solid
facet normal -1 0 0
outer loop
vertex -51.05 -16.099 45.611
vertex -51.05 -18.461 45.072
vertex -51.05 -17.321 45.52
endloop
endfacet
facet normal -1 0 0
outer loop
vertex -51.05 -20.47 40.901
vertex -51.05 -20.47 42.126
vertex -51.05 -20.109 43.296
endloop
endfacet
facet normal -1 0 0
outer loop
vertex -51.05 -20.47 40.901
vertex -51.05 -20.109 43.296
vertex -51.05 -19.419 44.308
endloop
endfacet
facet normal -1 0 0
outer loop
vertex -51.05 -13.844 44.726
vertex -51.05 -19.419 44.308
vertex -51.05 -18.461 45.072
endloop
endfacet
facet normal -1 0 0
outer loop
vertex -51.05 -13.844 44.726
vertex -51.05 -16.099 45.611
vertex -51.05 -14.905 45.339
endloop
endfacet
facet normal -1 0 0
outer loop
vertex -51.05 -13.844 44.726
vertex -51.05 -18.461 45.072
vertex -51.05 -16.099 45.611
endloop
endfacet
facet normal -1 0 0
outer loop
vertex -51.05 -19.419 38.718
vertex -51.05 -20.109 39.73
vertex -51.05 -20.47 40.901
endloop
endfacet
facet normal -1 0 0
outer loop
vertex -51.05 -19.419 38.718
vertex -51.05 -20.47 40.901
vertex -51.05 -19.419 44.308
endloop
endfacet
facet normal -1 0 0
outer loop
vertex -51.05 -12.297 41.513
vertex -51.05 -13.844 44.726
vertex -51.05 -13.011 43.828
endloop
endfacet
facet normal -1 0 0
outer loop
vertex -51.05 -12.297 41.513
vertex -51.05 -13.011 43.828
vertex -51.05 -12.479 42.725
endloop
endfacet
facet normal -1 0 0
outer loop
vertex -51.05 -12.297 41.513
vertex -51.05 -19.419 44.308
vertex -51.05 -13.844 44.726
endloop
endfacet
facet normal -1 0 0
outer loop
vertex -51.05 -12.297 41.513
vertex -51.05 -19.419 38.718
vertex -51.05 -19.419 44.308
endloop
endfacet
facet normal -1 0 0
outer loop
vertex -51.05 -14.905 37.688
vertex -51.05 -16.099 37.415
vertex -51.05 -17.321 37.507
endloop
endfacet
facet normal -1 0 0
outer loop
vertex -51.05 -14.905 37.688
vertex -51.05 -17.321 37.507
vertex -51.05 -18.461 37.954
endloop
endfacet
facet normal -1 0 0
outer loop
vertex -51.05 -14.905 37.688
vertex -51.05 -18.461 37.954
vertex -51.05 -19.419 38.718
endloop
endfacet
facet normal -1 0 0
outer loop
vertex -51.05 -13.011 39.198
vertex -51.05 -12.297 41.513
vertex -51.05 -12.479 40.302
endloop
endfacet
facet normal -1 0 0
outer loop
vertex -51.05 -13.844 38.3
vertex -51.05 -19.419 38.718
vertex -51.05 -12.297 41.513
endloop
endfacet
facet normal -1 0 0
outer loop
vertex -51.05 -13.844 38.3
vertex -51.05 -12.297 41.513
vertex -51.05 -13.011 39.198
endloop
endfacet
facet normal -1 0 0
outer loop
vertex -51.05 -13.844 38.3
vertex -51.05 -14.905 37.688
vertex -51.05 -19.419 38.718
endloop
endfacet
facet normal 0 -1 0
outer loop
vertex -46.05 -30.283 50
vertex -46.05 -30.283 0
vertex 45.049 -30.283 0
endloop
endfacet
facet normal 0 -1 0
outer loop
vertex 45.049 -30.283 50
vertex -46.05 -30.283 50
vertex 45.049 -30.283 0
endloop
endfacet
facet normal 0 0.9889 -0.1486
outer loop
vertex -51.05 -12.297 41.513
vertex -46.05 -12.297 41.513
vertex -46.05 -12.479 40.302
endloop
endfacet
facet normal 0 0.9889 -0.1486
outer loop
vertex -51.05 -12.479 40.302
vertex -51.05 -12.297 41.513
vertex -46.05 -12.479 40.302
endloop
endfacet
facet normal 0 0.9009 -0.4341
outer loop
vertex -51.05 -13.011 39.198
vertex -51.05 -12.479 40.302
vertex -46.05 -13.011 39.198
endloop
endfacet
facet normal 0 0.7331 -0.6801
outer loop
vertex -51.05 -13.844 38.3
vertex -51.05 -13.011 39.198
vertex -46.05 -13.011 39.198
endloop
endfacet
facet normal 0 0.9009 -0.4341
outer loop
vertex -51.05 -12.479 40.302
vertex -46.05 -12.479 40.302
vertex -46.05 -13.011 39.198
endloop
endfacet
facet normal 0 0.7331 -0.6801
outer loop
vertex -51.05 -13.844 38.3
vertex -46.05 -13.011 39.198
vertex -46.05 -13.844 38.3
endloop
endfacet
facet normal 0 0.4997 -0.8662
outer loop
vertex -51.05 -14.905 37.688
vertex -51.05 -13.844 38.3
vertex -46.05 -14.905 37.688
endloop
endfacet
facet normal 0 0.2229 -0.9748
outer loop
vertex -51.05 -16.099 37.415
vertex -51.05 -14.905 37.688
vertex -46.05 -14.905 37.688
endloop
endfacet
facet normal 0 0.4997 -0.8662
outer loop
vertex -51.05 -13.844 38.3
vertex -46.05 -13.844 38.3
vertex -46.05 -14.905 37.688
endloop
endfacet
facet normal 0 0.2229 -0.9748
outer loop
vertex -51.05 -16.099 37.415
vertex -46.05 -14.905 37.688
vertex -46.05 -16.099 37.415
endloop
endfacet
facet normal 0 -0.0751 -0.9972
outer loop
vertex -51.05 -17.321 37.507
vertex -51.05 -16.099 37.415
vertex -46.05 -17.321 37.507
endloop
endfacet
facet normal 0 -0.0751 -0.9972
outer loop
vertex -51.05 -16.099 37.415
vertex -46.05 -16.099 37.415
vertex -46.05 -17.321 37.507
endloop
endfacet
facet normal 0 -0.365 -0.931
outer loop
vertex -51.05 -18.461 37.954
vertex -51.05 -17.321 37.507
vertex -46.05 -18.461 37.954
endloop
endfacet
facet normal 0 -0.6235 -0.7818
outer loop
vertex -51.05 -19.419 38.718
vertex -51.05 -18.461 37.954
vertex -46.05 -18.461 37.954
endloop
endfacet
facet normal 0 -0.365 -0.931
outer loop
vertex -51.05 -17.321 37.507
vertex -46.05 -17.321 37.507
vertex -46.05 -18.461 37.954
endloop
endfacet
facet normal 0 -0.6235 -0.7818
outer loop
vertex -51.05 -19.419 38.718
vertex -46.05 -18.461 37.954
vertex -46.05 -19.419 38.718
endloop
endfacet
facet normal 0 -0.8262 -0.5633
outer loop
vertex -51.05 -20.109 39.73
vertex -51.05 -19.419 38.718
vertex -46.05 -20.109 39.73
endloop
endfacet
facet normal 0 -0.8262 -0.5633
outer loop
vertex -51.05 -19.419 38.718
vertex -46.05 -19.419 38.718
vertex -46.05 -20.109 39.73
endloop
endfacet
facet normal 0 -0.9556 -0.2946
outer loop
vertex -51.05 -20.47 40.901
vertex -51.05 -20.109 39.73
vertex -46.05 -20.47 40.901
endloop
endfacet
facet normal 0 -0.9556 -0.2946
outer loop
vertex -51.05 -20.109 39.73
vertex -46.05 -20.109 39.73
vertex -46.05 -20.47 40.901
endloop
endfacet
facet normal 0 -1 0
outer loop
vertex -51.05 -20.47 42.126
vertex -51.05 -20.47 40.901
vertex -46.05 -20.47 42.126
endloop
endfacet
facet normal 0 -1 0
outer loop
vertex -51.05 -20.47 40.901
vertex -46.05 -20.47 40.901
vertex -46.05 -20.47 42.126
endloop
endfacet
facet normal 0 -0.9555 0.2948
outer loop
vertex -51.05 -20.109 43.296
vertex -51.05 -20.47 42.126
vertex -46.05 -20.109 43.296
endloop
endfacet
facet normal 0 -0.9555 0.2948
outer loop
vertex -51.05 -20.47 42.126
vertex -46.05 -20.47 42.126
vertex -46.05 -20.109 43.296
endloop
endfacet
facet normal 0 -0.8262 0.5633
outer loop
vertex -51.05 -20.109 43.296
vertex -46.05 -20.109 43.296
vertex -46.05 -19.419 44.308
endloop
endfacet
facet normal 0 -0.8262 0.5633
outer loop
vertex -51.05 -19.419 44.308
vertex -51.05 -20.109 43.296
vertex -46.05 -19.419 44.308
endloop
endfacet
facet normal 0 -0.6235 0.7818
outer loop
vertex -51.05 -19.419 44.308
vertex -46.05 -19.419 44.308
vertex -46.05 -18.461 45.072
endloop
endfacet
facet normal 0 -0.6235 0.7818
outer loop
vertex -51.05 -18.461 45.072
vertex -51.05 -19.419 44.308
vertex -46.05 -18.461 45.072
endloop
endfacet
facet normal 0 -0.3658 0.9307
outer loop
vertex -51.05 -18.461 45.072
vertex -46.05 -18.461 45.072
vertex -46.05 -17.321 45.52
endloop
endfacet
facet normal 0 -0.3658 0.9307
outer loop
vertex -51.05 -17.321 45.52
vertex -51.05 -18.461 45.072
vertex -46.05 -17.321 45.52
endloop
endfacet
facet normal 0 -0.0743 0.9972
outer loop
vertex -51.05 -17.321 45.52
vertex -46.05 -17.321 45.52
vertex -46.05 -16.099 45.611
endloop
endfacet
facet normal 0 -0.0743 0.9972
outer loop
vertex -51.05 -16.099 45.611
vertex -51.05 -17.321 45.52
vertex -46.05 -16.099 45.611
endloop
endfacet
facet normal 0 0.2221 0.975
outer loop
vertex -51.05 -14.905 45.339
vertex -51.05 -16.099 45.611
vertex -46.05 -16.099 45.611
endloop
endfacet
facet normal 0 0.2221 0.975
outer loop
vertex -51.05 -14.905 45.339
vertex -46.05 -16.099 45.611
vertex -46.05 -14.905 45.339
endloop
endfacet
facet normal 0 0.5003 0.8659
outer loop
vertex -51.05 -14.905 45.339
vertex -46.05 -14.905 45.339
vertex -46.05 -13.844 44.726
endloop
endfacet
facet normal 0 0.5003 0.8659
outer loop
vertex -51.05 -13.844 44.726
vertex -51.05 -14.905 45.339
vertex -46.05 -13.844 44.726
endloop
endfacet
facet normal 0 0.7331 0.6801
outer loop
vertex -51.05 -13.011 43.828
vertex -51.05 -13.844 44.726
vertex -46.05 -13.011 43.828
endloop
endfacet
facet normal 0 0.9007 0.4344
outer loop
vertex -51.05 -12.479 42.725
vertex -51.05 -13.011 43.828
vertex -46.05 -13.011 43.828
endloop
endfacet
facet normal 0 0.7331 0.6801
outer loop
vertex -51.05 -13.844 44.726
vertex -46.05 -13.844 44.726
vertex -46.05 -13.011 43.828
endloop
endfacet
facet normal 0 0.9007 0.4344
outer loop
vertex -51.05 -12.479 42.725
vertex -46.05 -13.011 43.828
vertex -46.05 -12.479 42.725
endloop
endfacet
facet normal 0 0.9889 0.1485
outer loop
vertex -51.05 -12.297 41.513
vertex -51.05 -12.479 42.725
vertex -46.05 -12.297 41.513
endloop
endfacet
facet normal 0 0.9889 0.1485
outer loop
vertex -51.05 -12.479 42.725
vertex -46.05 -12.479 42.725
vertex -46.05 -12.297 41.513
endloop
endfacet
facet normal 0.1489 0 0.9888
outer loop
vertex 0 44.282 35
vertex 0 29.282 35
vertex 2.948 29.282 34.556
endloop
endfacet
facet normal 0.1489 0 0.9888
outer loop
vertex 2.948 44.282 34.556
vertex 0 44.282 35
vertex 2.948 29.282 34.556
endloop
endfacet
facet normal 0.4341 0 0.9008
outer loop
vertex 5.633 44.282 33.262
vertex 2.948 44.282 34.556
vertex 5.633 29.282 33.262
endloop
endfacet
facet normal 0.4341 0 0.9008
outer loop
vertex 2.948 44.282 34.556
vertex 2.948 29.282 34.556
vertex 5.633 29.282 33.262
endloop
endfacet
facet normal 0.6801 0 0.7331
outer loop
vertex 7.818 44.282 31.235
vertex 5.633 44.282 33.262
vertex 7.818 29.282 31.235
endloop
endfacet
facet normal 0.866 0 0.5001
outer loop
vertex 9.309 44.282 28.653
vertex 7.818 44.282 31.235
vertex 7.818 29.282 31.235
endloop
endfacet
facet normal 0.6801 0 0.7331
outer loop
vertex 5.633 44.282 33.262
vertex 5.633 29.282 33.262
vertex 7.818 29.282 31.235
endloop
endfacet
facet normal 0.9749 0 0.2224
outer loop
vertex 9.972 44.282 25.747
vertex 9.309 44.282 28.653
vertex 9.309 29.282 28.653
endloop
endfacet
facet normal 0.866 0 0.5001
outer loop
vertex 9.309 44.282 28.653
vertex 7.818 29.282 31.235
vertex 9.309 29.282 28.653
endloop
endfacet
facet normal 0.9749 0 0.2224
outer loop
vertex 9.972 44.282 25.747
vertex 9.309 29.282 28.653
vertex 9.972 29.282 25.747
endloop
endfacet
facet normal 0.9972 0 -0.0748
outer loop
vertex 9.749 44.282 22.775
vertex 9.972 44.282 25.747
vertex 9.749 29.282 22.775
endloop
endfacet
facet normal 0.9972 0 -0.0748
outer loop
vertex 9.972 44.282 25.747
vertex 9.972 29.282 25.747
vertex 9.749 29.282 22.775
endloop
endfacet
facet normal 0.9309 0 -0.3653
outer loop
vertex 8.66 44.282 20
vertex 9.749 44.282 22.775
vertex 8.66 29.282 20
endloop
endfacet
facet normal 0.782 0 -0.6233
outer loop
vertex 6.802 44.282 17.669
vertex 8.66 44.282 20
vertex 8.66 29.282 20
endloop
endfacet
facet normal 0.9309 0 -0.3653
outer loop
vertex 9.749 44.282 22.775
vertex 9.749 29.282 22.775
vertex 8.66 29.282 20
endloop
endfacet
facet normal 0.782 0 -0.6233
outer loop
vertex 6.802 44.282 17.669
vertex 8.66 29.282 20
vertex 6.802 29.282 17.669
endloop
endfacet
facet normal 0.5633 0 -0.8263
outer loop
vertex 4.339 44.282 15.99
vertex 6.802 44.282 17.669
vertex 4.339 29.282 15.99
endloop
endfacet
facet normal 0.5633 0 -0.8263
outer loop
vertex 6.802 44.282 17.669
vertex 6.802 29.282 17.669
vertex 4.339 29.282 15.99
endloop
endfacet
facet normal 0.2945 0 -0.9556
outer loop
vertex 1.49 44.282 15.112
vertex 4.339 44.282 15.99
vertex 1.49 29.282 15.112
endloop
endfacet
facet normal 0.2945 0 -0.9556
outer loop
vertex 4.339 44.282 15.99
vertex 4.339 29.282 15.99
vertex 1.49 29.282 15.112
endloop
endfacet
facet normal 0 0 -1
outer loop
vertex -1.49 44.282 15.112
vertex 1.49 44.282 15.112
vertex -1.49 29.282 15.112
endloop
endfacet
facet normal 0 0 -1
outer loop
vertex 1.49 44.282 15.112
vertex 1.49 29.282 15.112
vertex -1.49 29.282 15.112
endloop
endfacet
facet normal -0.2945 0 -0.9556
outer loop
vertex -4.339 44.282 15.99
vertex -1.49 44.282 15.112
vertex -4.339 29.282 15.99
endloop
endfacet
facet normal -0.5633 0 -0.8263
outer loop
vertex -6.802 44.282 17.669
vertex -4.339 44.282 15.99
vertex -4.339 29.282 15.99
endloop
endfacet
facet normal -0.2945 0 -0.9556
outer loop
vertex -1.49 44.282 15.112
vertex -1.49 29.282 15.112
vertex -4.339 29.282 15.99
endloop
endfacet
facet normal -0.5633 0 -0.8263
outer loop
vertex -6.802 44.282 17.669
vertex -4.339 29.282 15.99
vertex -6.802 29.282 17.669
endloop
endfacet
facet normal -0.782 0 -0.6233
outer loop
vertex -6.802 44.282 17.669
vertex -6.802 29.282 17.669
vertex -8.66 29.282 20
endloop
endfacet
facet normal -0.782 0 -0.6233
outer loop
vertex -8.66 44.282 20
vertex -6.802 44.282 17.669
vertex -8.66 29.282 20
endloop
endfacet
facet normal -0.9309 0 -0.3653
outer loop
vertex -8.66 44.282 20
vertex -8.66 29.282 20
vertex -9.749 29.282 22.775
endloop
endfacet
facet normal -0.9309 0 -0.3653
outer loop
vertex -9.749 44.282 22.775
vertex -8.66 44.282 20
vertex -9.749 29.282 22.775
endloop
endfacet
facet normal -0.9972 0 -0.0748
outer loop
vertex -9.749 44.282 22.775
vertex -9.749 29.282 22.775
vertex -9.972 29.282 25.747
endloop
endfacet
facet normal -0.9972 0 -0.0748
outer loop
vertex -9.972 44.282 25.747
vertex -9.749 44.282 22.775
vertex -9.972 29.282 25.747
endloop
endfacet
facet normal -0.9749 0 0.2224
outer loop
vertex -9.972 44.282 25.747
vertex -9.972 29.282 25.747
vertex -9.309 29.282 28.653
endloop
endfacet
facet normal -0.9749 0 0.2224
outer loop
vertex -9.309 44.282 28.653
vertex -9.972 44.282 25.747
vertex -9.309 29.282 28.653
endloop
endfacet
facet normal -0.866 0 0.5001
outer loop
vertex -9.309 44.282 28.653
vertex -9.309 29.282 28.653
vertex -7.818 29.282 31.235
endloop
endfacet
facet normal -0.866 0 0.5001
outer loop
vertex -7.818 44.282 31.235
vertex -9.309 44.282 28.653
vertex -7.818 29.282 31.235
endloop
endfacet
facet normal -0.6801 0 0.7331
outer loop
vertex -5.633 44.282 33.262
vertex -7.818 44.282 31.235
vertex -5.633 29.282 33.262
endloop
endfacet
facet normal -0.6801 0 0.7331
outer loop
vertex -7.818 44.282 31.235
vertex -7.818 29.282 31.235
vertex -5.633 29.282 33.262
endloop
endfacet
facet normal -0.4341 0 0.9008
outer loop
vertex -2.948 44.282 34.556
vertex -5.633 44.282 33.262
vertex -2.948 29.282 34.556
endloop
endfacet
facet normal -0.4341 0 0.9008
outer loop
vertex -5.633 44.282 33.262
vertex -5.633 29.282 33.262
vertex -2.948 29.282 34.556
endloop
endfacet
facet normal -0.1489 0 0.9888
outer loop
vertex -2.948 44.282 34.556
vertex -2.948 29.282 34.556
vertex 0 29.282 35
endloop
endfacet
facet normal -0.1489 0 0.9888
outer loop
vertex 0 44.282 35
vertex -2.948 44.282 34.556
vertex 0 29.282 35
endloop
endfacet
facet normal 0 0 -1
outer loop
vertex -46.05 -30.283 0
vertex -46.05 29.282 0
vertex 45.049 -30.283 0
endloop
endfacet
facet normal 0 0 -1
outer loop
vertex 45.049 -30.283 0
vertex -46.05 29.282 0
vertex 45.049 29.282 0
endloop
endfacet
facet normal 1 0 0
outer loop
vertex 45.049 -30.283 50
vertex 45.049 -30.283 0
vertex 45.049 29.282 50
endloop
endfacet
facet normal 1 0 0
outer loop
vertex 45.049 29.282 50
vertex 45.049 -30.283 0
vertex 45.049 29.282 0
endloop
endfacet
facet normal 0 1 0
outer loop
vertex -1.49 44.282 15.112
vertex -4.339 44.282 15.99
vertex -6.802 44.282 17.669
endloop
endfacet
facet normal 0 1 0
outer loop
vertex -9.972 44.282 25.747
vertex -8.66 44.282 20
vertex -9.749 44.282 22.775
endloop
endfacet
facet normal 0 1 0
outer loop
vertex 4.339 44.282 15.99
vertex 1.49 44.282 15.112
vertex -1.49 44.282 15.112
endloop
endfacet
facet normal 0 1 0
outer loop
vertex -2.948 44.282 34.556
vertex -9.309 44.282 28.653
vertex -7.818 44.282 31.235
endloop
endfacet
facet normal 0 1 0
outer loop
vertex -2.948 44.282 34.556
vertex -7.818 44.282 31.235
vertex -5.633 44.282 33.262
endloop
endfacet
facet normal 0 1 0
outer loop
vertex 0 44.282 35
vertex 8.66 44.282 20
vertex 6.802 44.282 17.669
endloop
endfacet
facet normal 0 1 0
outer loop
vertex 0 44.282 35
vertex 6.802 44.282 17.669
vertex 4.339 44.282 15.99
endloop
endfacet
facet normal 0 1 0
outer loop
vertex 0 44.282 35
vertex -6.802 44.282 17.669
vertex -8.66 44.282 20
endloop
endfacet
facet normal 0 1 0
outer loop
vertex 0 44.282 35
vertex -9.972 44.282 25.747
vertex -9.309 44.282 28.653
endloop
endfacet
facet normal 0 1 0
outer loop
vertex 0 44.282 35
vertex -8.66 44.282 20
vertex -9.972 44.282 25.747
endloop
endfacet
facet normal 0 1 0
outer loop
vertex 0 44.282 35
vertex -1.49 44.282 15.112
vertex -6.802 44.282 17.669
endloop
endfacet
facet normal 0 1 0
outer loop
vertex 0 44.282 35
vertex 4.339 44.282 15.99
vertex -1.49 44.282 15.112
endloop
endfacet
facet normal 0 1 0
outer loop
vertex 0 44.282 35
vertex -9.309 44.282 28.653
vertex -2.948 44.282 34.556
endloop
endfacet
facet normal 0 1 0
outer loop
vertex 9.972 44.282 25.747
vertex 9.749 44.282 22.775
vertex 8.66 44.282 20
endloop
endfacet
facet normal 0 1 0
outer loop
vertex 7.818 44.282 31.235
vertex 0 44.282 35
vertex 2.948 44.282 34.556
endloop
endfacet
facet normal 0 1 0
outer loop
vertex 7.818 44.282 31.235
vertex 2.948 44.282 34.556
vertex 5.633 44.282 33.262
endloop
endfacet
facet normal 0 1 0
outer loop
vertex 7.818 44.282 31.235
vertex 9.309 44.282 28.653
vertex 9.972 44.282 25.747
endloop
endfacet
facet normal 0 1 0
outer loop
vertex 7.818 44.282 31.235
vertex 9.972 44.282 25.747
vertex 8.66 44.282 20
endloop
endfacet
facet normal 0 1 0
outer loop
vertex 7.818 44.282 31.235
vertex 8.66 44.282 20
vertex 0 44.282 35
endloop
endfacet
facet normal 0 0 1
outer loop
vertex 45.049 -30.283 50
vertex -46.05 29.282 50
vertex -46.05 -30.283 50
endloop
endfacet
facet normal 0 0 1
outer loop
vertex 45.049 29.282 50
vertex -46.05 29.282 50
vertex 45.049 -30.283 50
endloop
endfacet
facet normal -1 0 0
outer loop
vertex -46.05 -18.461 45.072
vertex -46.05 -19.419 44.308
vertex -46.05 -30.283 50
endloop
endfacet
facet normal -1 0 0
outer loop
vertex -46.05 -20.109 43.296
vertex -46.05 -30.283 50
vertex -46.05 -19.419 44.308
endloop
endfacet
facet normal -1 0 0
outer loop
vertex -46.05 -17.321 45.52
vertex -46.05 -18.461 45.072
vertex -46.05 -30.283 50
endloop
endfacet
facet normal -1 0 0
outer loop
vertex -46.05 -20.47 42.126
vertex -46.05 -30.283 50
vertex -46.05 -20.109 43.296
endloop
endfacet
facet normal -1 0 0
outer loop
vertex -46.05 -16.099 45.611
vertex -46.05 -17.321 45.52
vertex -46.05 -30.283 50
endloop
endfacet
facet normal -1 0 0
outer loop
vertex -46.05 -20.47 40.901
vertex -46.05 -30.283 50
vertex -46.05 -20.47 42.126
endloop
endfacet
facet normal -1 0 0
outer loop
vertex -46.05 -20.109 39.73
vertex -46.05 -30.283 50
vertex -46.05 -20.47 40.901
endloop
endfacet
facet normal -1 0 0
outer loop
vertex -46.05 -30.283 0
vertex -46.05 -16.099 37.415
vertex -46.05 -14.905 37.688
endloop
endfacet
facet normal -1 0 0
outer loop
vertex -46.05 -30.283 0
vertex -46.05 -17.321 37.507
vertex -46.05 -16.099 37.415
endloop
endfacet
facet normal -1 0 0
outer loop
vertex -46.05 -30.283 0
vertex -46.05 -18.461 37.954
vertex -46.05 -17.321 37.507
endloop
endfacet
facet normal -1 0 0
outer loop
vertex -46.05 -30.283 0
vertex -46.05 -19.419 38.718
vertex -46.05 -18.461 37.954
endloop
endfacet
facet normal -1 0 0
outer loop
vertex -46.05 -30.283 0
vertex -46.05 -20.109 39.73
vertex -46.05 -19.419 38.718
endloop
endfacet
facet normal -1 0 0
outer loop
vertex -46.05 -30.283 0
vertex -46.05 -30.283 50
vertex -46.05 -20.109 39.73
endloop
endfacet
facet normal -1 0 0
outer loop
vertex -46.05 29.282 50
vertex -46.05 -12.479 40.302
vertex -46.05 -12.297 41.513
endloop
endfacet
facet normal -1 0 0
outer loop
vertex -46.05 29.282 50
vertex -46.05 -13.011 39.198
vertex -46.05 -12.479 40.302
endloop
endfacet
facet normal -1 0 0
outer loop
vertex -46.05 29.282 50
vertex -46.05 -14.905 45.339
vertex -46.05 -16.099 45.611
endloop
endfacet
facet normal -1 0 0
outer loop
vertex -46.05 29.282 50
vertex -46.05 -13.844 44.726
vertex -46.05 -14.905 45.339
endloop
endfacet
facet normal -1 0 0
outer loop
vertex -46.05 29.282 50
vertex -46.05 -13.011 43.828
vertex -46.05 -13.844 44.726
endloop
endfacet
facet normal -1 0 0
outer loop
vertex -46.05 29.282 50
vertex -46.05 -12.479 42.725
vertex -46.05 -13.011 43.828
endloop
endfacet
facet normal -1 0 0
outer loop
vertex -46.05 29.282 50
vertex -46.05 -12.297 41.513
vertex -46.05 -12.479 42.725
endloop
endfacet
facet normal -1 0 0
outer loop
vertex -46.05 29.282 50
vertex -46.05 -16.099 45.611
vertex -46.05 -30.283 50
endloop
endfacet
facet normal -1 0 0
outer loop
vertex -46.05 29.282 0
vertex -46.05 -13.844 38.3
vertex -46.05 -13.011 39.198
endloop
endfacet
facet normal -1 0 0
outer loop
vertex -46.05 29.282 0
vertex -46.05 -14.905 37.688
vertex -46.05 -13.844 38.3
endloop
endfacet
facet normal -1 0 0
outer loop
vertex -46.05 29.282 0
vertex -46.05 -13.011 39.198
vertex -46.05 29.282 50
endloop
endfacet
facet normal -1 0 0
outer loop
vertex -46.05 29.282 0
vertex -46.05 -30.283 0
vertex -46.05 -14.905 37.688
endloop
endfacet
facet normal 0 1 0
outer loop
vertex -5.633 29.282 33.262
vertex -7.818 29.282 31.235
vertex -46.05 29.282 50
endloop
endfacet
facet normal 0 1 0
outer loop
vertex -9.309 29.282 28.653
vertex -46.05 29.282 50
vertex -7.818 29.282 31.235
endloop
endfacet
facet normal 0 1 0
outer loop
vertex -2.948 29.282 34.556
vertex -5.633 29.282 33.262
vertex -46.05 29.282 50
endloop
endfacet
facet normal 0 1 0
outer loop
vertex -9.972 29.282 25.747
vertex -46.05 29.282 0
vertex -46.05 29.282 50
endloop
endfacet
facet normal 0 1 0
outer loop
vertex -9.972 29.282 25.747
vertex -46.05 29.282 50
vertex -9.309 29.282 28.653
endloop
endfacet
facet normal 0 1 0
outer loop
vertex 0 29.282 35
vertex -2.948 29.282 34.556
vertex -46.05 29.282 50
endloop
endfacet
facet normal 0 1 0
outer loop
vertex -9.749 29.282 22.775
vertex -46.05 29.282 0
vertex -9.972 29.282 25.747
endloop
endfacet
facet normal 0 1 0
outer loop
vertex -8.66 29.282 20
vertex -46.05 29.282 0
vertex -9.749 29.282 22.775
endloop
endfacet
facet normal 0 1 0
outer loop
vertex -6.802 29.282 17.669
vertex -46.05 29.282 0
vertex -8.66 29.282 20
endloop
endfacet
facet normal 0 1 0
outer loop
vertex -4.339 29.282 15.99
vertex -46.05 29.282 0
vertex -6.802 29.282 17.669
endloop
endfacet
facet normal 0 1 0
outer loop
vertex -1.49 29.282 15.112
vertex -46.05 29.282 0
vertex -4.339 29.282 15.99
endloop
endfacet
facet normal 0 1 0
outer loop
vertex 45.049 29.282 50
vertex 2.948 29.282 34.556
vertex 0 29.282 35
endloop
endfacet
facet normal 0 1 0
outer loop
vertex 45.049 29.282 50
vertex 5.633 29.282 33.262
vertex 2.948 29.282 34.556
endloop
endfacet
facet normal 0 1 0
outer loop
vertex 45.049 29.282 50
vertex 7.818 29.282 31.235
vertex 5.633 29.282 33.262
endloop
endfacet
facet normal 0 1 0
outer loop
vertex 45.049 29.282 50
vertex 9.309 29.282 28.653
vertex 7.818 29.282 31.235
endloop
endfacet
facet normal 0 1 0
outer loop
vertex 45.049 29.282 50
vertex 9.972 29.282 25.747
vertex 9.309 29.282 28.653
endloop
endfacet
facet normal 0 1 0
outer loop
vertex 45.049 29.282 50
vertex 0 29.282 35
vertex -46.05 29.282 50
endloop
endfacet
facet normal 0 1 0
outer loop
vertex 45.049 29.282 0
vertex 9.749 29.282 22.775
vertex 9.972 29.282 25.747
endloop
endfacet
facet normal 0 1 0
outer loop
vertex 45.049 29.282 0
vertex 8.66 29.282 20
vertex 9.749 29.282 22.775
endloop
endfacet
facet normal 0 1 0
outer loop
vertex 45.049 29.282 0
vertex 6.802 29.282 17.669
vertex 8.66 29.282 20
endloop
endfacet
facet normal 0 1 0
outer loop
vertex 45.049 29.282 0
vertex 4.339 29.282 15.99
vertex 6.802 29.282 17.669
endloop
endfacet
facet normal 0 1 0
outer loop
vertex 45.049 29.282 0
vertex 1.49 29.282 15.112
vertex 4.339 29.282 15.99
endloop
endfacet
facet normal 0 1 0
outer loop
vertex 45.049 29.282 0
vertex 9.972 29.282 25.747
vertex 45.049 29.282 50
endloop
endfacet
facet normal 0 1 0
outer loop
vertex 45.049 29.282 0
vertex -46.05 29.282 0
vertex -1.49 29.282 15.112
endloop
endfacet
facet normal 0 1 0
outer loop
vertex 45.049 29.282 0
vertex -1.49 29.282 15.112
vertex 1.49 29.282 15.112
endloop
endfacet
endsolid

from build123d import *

# Parameters (mm, degrees)
SKETCH1_W           = 91.09941719
SKETCH1_H           = 59.565003547
BOSS_EXTRUDE1_DEPTH = 50
SKETCH2_R           = 4.109340119
BOSS_EXTRUDE2_DEPTH = 5
SKETCH4_R           = 10
BOSS_EXTRUDE3_DEPTH = 15


with BuildPart() as part:
    # Sketch1 → Boss-Extrude1 (new body)
    with BuildSketch(Plane.XY):
        with Locations((-0.500546248, -0.500546249)):
            Rectangle(SKETCH1_W, SKETCH1_H)
    extrude(amount=BOSS_EXTRUDE1_DEPTH)

    # Sketch2 → Boss-Extrude2 (add)
    with BuildSketch(Plane.ZY.offset(46.050254843)):
        with Locations(Location((41.513253833, -16.406162376, 0), (0, 0, 90))):
            Circle(SKETCH2_R)
    extrude(amount=BOSS_EXTRUDE2_DEPTH)

    # Sketch4 → Boss-Extrude3 (add)
    with BuildSketch(Plane(origin=(0, 29.281955525, 0), x_dir=(1, 0, 0), z_dir=(0, 1, 0))):
        with Locations(Location((0, -25, 0), (0, 0, 270))):
            Circle(SKETCH4_R)
    extrude(amount=BOSS_EXTRUDE3_DEPTH)


solid = part.part
